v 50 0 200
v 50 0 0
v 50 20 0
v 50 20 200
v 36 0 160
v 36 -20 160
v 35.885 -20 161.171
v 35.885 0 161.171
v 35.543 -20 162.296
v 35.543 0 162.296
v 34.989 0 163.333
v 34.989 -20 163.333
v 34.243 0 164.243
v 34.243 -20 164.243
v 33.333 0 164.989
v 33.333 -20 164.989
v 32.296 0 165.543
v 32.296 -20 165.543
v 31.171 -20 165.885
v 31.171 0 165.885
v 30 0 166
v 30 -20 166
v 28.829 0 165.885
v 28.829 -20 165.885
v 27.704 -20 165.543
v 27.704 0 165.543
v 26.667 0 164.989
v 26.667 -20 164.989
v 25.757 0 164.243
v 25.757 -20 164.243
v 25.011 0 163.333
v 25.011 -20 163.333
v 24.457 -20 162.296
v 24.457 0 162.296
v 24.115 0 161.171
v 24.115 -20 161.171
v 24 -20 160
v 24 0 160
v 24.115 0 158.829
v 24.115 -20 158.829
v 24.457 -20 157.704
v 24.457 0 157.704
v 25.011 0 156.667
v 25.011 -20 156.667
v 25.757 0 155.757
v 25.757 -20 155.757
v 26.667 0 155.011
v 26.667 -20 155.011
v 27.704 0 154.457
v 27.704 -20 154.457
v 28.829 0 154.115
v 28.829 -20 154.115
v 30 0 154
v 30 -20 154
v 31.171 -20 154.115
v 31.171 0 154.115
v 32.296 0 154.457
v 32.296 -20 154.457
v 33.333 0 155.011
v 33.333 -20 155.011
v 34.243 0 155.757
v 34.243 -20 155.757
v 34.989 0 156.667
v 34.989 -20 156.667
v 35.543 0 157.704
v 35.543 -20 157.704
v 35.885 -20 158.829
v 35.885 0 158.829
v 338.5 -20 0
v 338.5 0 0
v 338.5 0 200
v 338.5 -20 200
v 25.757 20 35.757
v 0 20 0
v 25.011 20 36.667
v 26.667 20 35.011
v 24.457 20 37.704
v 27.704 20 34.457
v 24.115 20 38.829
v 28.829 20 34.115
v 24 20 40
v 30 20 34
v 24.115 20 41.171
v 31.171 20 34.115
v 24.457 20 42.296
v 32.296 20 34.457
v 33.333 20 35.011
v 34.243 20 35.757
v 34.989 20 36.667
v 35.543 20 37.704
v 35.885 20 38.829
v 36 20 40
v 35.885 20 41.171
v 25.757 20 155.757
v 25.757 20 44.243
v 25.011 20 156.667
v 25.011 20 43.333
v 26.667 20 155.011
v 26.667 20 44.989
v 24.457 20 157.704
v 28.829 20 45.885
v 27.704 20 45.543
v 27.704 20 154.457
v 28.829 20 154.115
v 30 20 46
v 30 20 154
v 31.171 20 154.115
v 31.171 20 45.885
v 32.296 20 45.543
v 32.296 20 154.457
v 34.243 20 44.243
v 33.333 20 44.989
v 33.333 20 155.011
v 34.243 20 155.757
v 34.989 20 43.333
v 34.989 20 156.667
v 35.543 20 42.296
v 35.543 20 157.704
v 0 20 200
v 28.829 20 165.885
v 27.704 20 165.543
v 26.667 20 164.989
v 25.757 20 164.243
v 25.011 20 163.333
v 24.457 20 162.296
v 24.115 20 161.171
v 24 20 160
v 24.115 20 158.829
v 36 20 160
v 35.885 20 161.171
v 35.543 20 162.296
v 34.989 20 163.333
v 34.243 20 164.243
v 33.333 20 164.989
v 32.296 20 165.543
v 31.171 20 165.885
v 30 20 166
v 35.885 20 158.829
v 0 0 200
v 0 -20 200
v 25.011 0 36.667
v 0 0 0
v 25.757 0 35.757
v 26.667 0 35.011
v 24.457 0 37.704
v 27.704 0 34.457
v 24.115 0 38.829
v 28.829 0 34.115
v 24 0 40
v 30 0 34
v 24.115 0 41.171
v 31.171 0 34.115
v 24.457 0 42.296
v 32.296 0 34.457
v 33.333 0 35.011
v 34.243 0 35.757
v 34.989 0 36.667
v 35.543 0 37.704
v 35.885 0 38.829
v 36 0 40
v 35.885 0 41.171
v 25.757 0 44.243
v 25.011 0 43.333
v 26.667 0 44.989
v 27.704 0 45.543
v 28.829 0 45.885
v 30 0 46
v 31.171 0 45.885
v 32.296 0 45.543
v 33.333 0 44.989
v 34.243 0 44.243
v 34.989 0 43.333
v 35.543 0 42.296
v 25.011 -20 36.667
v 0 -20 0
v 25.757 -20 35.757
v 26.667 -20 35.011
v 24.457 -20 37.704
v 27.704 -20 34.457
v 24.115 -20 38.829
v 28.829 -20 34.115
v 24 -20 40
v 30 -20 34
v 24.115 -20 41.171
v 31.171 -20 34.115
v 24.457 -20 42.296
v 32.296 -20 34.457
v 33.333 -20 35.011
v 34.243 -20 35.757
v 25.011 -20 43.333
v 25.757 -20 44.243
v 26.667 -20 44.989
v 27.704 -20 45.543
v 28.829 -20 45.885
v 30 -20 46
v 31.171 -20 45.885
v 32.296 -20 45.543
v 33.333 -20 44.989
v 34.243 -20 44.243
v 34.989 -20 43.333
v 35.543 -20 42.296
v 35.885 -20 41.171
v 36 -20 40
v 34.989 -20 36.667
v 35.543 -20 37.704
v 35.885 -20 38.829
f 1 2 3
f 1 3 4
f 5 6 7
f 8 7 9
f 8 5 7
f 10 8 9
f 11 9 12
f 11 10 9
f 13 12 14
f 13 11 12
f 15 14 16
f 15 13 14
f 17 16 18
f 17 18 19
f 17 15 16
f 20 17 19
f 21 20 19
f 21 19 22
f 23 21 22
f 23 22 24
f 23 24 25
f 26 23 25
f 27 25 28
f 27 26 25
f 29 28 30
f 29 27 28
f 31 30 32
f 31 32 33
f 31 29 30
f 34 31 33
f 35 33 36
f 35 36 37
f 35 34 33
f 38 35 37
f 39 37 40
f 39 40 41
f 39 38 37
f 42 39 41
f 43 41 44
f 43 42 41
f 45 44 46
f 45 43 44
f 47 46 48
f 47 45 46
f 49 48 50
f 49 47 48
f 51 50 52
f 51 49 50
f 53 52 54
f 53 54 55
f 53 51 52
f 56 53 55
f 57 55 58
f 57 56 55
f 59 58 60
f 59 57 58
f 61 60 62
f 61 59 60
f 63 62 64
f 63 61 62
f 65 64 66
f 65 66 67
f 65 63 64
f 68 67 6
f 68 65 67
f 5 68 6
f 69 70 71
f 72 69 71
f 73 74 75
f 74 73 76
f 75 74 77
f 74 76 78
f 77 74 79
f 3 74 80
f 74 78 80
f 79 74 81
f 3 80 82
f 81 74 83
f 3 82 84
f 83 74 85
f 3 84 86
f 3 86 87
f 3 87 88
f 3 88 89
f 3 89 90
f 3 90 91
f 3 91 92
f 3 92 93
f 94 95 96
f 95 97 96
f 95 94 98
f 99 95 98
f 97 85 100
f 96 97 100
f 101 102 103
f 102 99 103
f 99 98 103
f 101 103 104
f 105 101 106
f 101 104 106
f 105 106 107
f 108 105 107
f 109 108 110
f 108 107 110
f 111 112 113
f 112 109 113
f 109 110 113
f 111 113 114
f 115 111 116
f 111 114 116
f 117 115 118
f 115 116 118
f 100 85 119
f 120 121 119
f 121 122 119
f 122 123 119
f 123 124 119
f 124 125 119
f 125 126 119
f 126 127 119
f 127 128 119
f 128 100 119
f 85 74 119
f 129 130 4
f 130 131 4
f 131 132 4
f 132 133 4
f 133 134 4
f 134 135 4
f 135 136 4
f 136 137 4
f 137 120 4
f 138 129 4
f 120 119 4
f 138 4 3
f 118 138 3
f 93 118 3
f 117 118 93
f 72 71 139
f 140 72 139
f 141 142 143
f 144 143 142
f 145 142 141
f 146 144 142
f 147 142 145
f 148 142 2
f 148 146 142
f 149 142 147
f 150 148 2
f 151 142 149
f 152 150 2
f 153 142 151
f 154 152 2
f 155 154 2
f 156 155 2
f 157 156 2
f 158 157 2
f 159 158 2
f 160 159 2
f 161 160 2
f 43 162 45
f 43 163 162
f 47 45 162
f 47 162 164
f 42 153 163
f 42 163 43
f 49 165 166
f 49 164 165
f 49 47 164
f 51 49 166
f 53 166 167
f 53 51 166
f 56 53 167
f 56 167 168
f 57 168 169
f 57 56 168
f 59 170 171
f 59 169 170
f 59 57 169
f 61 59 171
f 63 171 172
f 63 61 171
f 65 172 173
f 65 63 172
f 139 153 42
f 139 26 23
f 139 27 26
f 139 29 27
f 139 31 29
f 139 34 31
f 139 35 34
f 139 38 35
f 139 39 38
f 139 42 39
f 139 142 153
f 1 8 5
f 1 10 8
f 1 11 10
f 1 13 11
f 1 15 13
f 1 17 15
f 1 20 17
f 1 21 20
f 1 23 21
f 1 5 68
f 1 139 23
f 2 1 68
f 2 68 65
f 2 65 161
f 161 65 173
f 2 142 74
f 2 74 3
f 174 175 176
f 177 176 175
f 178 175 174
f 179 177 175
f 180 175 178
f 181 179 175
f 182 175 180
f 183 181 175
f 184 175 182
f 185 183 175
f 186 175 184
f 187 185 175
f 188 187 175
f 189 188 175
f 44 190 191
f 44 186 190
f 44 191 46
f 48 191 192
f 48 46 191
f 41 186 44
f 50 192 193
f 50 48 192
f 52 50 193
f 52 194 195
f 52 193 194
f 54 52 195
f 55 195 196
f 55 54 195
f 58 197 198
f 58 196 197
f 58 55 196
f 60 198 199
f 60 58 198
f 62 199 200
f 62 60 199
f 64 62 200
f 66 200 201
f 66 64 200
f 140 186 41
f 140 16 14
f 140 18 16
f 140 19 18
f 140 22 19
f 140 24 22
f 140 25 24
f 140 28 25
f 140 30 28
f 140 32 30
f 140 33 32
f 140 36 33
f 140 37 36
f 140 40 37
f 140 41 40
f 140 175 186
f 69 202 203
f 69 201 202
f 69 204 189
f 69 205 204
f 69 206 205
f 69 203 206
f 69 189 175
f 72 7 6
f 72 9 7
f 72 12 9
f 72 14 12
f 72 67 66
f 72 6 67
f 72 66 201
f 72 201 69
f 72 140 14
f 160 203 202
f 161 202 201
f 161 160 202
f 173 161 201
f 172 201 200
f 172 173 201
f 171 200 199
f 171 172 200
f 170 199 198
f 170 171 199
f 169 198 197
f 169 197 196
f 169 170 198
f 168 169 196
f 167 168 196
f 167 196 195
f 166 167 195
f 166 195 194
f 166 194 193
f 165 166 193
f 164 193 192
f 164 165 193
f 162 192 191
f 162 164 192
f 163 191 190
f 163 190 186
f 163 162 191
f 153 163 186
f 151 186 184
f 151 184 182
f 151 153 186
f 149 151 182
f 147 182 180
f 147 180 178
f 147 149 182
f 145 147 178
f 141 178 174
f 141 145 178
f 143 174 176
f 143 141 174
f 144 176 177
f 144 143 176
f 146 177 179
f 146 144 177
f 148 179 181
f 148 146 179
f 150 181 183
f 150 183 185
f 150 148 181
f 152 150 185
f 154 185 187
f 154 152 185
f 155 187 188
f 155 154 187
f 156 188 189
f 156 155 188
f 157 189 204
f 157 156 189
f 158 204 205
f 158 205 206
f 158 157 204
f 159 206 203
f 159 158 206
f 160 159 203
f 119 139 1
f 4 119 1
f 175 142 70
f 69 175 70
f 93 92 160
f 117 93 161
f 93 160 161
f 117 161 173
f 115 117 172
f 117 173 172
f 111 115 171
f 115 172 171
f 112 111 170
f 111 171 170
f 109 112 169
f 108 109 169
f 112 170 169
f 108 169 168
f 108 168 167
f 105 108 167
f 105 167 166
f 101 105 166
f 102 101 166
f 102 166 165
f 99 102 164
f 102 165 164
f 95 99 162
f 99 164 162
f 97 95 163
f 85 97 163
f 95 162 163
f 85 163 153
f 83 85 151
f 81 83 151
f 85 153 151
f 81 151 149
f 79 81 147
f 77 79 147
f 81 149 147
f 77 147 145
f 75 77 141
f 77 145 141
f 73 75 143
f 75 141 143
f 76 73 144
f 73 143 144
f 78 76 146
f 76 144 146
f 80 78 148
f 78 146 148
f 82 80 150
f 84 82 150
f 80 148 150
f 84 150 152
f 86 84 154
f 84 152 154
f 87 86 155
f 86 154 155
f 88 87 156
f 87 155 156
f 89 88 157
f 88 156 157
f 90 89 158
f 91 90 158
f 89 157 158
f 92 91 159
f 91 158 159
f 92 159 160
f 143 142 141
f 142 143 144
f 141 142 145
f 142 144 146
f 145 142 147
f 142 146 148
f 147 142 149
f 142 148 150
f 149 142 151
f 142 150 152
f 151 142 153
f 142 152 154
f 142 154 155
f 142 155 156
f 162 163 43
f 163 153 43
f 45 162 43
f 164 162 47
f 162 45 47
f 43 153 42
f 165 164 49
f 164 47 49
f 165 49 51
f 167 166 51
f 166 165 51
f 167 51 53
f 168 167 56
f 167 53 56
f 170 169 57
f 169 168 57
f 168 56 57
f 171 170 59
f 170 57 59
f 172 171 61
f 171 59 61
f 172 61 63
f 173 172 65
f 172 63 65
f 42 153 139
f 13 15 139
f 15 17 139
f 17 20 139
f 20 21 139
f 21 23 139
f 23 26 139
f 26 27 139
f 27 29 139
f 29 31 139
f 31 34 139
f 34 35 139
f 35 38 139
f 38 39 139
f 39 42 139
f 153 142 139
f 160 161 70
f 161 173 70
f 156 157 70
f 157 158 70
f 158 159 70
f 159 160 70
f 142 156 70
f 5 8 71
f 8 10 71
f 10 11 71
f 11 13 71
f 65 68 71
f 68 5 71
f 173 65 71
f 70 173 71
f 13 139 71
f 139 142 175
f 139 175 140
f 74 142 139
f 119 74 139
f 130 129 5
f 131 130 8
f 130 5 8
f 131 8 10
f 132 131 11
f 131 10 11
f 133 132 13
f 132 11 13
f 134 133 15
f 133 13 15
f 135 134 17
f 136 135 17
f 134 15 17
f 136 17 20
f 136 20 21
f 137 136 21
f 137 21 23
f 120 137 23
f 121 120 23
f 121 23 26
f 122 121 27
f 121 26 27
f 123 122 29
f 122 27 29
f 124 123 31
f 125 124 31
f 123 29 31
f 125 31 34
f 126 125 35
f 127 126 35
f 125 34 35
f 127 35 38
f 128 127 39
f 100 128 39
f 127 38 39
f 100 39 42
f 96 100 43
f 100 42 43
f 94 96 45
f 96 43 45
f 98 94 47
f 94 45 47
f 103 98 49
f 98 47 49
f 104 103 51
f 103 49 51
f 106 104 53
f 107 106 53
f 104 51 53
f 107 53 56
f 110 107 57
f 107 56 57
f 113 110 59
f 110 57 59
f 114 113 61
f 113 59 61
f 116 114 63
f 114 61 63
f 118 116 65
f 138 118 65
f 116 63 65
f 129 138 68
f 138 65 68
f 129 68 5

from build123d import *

# Parameters (mm, degrees)
F0_W     = 288.5
F0_H     = 200
F0_W_2   = 50
F0_R     = 6
F1_DEPTH = 20
F2_DEPTH = 20


with BuildPart() as f1:
    # F0 (on Front) → F1 (new body)
    with BuildSketch(Plane.XZ):
        with Locations((194.25, 100)):
            Rectangle(F0_W, F0_H)
        with Locations((25, 100)):
            Rectangle(F0_W_2, F0_H)
        with Locations((30, 40)):
            Circle(F0_R, mode=Mode.SUBTRACT)
        with Locations((30, 160)):
            Circle(F0_R, mode=Mode.SUBTRACT)
    extrude(amount=F1_DEPTH)


with BuildPart() as f2:
    # F0 (on Front) → F2 (new body)
    with BuildSketch(Plane.XZ):
        with Locations((25, 100)):
            Rectangle(F0_W_2, F0_H)
        with Locations((30, 40)):
            Circle(F0_R, mode=Mode.SUBTRACT)
        with Locations((30, 160)):
            Circle(F0_R, mode=Mode.SUBTRACT)
    extrude(amount=-F2_DEPTH)


solid = Compound([f1.part, f2.part])
